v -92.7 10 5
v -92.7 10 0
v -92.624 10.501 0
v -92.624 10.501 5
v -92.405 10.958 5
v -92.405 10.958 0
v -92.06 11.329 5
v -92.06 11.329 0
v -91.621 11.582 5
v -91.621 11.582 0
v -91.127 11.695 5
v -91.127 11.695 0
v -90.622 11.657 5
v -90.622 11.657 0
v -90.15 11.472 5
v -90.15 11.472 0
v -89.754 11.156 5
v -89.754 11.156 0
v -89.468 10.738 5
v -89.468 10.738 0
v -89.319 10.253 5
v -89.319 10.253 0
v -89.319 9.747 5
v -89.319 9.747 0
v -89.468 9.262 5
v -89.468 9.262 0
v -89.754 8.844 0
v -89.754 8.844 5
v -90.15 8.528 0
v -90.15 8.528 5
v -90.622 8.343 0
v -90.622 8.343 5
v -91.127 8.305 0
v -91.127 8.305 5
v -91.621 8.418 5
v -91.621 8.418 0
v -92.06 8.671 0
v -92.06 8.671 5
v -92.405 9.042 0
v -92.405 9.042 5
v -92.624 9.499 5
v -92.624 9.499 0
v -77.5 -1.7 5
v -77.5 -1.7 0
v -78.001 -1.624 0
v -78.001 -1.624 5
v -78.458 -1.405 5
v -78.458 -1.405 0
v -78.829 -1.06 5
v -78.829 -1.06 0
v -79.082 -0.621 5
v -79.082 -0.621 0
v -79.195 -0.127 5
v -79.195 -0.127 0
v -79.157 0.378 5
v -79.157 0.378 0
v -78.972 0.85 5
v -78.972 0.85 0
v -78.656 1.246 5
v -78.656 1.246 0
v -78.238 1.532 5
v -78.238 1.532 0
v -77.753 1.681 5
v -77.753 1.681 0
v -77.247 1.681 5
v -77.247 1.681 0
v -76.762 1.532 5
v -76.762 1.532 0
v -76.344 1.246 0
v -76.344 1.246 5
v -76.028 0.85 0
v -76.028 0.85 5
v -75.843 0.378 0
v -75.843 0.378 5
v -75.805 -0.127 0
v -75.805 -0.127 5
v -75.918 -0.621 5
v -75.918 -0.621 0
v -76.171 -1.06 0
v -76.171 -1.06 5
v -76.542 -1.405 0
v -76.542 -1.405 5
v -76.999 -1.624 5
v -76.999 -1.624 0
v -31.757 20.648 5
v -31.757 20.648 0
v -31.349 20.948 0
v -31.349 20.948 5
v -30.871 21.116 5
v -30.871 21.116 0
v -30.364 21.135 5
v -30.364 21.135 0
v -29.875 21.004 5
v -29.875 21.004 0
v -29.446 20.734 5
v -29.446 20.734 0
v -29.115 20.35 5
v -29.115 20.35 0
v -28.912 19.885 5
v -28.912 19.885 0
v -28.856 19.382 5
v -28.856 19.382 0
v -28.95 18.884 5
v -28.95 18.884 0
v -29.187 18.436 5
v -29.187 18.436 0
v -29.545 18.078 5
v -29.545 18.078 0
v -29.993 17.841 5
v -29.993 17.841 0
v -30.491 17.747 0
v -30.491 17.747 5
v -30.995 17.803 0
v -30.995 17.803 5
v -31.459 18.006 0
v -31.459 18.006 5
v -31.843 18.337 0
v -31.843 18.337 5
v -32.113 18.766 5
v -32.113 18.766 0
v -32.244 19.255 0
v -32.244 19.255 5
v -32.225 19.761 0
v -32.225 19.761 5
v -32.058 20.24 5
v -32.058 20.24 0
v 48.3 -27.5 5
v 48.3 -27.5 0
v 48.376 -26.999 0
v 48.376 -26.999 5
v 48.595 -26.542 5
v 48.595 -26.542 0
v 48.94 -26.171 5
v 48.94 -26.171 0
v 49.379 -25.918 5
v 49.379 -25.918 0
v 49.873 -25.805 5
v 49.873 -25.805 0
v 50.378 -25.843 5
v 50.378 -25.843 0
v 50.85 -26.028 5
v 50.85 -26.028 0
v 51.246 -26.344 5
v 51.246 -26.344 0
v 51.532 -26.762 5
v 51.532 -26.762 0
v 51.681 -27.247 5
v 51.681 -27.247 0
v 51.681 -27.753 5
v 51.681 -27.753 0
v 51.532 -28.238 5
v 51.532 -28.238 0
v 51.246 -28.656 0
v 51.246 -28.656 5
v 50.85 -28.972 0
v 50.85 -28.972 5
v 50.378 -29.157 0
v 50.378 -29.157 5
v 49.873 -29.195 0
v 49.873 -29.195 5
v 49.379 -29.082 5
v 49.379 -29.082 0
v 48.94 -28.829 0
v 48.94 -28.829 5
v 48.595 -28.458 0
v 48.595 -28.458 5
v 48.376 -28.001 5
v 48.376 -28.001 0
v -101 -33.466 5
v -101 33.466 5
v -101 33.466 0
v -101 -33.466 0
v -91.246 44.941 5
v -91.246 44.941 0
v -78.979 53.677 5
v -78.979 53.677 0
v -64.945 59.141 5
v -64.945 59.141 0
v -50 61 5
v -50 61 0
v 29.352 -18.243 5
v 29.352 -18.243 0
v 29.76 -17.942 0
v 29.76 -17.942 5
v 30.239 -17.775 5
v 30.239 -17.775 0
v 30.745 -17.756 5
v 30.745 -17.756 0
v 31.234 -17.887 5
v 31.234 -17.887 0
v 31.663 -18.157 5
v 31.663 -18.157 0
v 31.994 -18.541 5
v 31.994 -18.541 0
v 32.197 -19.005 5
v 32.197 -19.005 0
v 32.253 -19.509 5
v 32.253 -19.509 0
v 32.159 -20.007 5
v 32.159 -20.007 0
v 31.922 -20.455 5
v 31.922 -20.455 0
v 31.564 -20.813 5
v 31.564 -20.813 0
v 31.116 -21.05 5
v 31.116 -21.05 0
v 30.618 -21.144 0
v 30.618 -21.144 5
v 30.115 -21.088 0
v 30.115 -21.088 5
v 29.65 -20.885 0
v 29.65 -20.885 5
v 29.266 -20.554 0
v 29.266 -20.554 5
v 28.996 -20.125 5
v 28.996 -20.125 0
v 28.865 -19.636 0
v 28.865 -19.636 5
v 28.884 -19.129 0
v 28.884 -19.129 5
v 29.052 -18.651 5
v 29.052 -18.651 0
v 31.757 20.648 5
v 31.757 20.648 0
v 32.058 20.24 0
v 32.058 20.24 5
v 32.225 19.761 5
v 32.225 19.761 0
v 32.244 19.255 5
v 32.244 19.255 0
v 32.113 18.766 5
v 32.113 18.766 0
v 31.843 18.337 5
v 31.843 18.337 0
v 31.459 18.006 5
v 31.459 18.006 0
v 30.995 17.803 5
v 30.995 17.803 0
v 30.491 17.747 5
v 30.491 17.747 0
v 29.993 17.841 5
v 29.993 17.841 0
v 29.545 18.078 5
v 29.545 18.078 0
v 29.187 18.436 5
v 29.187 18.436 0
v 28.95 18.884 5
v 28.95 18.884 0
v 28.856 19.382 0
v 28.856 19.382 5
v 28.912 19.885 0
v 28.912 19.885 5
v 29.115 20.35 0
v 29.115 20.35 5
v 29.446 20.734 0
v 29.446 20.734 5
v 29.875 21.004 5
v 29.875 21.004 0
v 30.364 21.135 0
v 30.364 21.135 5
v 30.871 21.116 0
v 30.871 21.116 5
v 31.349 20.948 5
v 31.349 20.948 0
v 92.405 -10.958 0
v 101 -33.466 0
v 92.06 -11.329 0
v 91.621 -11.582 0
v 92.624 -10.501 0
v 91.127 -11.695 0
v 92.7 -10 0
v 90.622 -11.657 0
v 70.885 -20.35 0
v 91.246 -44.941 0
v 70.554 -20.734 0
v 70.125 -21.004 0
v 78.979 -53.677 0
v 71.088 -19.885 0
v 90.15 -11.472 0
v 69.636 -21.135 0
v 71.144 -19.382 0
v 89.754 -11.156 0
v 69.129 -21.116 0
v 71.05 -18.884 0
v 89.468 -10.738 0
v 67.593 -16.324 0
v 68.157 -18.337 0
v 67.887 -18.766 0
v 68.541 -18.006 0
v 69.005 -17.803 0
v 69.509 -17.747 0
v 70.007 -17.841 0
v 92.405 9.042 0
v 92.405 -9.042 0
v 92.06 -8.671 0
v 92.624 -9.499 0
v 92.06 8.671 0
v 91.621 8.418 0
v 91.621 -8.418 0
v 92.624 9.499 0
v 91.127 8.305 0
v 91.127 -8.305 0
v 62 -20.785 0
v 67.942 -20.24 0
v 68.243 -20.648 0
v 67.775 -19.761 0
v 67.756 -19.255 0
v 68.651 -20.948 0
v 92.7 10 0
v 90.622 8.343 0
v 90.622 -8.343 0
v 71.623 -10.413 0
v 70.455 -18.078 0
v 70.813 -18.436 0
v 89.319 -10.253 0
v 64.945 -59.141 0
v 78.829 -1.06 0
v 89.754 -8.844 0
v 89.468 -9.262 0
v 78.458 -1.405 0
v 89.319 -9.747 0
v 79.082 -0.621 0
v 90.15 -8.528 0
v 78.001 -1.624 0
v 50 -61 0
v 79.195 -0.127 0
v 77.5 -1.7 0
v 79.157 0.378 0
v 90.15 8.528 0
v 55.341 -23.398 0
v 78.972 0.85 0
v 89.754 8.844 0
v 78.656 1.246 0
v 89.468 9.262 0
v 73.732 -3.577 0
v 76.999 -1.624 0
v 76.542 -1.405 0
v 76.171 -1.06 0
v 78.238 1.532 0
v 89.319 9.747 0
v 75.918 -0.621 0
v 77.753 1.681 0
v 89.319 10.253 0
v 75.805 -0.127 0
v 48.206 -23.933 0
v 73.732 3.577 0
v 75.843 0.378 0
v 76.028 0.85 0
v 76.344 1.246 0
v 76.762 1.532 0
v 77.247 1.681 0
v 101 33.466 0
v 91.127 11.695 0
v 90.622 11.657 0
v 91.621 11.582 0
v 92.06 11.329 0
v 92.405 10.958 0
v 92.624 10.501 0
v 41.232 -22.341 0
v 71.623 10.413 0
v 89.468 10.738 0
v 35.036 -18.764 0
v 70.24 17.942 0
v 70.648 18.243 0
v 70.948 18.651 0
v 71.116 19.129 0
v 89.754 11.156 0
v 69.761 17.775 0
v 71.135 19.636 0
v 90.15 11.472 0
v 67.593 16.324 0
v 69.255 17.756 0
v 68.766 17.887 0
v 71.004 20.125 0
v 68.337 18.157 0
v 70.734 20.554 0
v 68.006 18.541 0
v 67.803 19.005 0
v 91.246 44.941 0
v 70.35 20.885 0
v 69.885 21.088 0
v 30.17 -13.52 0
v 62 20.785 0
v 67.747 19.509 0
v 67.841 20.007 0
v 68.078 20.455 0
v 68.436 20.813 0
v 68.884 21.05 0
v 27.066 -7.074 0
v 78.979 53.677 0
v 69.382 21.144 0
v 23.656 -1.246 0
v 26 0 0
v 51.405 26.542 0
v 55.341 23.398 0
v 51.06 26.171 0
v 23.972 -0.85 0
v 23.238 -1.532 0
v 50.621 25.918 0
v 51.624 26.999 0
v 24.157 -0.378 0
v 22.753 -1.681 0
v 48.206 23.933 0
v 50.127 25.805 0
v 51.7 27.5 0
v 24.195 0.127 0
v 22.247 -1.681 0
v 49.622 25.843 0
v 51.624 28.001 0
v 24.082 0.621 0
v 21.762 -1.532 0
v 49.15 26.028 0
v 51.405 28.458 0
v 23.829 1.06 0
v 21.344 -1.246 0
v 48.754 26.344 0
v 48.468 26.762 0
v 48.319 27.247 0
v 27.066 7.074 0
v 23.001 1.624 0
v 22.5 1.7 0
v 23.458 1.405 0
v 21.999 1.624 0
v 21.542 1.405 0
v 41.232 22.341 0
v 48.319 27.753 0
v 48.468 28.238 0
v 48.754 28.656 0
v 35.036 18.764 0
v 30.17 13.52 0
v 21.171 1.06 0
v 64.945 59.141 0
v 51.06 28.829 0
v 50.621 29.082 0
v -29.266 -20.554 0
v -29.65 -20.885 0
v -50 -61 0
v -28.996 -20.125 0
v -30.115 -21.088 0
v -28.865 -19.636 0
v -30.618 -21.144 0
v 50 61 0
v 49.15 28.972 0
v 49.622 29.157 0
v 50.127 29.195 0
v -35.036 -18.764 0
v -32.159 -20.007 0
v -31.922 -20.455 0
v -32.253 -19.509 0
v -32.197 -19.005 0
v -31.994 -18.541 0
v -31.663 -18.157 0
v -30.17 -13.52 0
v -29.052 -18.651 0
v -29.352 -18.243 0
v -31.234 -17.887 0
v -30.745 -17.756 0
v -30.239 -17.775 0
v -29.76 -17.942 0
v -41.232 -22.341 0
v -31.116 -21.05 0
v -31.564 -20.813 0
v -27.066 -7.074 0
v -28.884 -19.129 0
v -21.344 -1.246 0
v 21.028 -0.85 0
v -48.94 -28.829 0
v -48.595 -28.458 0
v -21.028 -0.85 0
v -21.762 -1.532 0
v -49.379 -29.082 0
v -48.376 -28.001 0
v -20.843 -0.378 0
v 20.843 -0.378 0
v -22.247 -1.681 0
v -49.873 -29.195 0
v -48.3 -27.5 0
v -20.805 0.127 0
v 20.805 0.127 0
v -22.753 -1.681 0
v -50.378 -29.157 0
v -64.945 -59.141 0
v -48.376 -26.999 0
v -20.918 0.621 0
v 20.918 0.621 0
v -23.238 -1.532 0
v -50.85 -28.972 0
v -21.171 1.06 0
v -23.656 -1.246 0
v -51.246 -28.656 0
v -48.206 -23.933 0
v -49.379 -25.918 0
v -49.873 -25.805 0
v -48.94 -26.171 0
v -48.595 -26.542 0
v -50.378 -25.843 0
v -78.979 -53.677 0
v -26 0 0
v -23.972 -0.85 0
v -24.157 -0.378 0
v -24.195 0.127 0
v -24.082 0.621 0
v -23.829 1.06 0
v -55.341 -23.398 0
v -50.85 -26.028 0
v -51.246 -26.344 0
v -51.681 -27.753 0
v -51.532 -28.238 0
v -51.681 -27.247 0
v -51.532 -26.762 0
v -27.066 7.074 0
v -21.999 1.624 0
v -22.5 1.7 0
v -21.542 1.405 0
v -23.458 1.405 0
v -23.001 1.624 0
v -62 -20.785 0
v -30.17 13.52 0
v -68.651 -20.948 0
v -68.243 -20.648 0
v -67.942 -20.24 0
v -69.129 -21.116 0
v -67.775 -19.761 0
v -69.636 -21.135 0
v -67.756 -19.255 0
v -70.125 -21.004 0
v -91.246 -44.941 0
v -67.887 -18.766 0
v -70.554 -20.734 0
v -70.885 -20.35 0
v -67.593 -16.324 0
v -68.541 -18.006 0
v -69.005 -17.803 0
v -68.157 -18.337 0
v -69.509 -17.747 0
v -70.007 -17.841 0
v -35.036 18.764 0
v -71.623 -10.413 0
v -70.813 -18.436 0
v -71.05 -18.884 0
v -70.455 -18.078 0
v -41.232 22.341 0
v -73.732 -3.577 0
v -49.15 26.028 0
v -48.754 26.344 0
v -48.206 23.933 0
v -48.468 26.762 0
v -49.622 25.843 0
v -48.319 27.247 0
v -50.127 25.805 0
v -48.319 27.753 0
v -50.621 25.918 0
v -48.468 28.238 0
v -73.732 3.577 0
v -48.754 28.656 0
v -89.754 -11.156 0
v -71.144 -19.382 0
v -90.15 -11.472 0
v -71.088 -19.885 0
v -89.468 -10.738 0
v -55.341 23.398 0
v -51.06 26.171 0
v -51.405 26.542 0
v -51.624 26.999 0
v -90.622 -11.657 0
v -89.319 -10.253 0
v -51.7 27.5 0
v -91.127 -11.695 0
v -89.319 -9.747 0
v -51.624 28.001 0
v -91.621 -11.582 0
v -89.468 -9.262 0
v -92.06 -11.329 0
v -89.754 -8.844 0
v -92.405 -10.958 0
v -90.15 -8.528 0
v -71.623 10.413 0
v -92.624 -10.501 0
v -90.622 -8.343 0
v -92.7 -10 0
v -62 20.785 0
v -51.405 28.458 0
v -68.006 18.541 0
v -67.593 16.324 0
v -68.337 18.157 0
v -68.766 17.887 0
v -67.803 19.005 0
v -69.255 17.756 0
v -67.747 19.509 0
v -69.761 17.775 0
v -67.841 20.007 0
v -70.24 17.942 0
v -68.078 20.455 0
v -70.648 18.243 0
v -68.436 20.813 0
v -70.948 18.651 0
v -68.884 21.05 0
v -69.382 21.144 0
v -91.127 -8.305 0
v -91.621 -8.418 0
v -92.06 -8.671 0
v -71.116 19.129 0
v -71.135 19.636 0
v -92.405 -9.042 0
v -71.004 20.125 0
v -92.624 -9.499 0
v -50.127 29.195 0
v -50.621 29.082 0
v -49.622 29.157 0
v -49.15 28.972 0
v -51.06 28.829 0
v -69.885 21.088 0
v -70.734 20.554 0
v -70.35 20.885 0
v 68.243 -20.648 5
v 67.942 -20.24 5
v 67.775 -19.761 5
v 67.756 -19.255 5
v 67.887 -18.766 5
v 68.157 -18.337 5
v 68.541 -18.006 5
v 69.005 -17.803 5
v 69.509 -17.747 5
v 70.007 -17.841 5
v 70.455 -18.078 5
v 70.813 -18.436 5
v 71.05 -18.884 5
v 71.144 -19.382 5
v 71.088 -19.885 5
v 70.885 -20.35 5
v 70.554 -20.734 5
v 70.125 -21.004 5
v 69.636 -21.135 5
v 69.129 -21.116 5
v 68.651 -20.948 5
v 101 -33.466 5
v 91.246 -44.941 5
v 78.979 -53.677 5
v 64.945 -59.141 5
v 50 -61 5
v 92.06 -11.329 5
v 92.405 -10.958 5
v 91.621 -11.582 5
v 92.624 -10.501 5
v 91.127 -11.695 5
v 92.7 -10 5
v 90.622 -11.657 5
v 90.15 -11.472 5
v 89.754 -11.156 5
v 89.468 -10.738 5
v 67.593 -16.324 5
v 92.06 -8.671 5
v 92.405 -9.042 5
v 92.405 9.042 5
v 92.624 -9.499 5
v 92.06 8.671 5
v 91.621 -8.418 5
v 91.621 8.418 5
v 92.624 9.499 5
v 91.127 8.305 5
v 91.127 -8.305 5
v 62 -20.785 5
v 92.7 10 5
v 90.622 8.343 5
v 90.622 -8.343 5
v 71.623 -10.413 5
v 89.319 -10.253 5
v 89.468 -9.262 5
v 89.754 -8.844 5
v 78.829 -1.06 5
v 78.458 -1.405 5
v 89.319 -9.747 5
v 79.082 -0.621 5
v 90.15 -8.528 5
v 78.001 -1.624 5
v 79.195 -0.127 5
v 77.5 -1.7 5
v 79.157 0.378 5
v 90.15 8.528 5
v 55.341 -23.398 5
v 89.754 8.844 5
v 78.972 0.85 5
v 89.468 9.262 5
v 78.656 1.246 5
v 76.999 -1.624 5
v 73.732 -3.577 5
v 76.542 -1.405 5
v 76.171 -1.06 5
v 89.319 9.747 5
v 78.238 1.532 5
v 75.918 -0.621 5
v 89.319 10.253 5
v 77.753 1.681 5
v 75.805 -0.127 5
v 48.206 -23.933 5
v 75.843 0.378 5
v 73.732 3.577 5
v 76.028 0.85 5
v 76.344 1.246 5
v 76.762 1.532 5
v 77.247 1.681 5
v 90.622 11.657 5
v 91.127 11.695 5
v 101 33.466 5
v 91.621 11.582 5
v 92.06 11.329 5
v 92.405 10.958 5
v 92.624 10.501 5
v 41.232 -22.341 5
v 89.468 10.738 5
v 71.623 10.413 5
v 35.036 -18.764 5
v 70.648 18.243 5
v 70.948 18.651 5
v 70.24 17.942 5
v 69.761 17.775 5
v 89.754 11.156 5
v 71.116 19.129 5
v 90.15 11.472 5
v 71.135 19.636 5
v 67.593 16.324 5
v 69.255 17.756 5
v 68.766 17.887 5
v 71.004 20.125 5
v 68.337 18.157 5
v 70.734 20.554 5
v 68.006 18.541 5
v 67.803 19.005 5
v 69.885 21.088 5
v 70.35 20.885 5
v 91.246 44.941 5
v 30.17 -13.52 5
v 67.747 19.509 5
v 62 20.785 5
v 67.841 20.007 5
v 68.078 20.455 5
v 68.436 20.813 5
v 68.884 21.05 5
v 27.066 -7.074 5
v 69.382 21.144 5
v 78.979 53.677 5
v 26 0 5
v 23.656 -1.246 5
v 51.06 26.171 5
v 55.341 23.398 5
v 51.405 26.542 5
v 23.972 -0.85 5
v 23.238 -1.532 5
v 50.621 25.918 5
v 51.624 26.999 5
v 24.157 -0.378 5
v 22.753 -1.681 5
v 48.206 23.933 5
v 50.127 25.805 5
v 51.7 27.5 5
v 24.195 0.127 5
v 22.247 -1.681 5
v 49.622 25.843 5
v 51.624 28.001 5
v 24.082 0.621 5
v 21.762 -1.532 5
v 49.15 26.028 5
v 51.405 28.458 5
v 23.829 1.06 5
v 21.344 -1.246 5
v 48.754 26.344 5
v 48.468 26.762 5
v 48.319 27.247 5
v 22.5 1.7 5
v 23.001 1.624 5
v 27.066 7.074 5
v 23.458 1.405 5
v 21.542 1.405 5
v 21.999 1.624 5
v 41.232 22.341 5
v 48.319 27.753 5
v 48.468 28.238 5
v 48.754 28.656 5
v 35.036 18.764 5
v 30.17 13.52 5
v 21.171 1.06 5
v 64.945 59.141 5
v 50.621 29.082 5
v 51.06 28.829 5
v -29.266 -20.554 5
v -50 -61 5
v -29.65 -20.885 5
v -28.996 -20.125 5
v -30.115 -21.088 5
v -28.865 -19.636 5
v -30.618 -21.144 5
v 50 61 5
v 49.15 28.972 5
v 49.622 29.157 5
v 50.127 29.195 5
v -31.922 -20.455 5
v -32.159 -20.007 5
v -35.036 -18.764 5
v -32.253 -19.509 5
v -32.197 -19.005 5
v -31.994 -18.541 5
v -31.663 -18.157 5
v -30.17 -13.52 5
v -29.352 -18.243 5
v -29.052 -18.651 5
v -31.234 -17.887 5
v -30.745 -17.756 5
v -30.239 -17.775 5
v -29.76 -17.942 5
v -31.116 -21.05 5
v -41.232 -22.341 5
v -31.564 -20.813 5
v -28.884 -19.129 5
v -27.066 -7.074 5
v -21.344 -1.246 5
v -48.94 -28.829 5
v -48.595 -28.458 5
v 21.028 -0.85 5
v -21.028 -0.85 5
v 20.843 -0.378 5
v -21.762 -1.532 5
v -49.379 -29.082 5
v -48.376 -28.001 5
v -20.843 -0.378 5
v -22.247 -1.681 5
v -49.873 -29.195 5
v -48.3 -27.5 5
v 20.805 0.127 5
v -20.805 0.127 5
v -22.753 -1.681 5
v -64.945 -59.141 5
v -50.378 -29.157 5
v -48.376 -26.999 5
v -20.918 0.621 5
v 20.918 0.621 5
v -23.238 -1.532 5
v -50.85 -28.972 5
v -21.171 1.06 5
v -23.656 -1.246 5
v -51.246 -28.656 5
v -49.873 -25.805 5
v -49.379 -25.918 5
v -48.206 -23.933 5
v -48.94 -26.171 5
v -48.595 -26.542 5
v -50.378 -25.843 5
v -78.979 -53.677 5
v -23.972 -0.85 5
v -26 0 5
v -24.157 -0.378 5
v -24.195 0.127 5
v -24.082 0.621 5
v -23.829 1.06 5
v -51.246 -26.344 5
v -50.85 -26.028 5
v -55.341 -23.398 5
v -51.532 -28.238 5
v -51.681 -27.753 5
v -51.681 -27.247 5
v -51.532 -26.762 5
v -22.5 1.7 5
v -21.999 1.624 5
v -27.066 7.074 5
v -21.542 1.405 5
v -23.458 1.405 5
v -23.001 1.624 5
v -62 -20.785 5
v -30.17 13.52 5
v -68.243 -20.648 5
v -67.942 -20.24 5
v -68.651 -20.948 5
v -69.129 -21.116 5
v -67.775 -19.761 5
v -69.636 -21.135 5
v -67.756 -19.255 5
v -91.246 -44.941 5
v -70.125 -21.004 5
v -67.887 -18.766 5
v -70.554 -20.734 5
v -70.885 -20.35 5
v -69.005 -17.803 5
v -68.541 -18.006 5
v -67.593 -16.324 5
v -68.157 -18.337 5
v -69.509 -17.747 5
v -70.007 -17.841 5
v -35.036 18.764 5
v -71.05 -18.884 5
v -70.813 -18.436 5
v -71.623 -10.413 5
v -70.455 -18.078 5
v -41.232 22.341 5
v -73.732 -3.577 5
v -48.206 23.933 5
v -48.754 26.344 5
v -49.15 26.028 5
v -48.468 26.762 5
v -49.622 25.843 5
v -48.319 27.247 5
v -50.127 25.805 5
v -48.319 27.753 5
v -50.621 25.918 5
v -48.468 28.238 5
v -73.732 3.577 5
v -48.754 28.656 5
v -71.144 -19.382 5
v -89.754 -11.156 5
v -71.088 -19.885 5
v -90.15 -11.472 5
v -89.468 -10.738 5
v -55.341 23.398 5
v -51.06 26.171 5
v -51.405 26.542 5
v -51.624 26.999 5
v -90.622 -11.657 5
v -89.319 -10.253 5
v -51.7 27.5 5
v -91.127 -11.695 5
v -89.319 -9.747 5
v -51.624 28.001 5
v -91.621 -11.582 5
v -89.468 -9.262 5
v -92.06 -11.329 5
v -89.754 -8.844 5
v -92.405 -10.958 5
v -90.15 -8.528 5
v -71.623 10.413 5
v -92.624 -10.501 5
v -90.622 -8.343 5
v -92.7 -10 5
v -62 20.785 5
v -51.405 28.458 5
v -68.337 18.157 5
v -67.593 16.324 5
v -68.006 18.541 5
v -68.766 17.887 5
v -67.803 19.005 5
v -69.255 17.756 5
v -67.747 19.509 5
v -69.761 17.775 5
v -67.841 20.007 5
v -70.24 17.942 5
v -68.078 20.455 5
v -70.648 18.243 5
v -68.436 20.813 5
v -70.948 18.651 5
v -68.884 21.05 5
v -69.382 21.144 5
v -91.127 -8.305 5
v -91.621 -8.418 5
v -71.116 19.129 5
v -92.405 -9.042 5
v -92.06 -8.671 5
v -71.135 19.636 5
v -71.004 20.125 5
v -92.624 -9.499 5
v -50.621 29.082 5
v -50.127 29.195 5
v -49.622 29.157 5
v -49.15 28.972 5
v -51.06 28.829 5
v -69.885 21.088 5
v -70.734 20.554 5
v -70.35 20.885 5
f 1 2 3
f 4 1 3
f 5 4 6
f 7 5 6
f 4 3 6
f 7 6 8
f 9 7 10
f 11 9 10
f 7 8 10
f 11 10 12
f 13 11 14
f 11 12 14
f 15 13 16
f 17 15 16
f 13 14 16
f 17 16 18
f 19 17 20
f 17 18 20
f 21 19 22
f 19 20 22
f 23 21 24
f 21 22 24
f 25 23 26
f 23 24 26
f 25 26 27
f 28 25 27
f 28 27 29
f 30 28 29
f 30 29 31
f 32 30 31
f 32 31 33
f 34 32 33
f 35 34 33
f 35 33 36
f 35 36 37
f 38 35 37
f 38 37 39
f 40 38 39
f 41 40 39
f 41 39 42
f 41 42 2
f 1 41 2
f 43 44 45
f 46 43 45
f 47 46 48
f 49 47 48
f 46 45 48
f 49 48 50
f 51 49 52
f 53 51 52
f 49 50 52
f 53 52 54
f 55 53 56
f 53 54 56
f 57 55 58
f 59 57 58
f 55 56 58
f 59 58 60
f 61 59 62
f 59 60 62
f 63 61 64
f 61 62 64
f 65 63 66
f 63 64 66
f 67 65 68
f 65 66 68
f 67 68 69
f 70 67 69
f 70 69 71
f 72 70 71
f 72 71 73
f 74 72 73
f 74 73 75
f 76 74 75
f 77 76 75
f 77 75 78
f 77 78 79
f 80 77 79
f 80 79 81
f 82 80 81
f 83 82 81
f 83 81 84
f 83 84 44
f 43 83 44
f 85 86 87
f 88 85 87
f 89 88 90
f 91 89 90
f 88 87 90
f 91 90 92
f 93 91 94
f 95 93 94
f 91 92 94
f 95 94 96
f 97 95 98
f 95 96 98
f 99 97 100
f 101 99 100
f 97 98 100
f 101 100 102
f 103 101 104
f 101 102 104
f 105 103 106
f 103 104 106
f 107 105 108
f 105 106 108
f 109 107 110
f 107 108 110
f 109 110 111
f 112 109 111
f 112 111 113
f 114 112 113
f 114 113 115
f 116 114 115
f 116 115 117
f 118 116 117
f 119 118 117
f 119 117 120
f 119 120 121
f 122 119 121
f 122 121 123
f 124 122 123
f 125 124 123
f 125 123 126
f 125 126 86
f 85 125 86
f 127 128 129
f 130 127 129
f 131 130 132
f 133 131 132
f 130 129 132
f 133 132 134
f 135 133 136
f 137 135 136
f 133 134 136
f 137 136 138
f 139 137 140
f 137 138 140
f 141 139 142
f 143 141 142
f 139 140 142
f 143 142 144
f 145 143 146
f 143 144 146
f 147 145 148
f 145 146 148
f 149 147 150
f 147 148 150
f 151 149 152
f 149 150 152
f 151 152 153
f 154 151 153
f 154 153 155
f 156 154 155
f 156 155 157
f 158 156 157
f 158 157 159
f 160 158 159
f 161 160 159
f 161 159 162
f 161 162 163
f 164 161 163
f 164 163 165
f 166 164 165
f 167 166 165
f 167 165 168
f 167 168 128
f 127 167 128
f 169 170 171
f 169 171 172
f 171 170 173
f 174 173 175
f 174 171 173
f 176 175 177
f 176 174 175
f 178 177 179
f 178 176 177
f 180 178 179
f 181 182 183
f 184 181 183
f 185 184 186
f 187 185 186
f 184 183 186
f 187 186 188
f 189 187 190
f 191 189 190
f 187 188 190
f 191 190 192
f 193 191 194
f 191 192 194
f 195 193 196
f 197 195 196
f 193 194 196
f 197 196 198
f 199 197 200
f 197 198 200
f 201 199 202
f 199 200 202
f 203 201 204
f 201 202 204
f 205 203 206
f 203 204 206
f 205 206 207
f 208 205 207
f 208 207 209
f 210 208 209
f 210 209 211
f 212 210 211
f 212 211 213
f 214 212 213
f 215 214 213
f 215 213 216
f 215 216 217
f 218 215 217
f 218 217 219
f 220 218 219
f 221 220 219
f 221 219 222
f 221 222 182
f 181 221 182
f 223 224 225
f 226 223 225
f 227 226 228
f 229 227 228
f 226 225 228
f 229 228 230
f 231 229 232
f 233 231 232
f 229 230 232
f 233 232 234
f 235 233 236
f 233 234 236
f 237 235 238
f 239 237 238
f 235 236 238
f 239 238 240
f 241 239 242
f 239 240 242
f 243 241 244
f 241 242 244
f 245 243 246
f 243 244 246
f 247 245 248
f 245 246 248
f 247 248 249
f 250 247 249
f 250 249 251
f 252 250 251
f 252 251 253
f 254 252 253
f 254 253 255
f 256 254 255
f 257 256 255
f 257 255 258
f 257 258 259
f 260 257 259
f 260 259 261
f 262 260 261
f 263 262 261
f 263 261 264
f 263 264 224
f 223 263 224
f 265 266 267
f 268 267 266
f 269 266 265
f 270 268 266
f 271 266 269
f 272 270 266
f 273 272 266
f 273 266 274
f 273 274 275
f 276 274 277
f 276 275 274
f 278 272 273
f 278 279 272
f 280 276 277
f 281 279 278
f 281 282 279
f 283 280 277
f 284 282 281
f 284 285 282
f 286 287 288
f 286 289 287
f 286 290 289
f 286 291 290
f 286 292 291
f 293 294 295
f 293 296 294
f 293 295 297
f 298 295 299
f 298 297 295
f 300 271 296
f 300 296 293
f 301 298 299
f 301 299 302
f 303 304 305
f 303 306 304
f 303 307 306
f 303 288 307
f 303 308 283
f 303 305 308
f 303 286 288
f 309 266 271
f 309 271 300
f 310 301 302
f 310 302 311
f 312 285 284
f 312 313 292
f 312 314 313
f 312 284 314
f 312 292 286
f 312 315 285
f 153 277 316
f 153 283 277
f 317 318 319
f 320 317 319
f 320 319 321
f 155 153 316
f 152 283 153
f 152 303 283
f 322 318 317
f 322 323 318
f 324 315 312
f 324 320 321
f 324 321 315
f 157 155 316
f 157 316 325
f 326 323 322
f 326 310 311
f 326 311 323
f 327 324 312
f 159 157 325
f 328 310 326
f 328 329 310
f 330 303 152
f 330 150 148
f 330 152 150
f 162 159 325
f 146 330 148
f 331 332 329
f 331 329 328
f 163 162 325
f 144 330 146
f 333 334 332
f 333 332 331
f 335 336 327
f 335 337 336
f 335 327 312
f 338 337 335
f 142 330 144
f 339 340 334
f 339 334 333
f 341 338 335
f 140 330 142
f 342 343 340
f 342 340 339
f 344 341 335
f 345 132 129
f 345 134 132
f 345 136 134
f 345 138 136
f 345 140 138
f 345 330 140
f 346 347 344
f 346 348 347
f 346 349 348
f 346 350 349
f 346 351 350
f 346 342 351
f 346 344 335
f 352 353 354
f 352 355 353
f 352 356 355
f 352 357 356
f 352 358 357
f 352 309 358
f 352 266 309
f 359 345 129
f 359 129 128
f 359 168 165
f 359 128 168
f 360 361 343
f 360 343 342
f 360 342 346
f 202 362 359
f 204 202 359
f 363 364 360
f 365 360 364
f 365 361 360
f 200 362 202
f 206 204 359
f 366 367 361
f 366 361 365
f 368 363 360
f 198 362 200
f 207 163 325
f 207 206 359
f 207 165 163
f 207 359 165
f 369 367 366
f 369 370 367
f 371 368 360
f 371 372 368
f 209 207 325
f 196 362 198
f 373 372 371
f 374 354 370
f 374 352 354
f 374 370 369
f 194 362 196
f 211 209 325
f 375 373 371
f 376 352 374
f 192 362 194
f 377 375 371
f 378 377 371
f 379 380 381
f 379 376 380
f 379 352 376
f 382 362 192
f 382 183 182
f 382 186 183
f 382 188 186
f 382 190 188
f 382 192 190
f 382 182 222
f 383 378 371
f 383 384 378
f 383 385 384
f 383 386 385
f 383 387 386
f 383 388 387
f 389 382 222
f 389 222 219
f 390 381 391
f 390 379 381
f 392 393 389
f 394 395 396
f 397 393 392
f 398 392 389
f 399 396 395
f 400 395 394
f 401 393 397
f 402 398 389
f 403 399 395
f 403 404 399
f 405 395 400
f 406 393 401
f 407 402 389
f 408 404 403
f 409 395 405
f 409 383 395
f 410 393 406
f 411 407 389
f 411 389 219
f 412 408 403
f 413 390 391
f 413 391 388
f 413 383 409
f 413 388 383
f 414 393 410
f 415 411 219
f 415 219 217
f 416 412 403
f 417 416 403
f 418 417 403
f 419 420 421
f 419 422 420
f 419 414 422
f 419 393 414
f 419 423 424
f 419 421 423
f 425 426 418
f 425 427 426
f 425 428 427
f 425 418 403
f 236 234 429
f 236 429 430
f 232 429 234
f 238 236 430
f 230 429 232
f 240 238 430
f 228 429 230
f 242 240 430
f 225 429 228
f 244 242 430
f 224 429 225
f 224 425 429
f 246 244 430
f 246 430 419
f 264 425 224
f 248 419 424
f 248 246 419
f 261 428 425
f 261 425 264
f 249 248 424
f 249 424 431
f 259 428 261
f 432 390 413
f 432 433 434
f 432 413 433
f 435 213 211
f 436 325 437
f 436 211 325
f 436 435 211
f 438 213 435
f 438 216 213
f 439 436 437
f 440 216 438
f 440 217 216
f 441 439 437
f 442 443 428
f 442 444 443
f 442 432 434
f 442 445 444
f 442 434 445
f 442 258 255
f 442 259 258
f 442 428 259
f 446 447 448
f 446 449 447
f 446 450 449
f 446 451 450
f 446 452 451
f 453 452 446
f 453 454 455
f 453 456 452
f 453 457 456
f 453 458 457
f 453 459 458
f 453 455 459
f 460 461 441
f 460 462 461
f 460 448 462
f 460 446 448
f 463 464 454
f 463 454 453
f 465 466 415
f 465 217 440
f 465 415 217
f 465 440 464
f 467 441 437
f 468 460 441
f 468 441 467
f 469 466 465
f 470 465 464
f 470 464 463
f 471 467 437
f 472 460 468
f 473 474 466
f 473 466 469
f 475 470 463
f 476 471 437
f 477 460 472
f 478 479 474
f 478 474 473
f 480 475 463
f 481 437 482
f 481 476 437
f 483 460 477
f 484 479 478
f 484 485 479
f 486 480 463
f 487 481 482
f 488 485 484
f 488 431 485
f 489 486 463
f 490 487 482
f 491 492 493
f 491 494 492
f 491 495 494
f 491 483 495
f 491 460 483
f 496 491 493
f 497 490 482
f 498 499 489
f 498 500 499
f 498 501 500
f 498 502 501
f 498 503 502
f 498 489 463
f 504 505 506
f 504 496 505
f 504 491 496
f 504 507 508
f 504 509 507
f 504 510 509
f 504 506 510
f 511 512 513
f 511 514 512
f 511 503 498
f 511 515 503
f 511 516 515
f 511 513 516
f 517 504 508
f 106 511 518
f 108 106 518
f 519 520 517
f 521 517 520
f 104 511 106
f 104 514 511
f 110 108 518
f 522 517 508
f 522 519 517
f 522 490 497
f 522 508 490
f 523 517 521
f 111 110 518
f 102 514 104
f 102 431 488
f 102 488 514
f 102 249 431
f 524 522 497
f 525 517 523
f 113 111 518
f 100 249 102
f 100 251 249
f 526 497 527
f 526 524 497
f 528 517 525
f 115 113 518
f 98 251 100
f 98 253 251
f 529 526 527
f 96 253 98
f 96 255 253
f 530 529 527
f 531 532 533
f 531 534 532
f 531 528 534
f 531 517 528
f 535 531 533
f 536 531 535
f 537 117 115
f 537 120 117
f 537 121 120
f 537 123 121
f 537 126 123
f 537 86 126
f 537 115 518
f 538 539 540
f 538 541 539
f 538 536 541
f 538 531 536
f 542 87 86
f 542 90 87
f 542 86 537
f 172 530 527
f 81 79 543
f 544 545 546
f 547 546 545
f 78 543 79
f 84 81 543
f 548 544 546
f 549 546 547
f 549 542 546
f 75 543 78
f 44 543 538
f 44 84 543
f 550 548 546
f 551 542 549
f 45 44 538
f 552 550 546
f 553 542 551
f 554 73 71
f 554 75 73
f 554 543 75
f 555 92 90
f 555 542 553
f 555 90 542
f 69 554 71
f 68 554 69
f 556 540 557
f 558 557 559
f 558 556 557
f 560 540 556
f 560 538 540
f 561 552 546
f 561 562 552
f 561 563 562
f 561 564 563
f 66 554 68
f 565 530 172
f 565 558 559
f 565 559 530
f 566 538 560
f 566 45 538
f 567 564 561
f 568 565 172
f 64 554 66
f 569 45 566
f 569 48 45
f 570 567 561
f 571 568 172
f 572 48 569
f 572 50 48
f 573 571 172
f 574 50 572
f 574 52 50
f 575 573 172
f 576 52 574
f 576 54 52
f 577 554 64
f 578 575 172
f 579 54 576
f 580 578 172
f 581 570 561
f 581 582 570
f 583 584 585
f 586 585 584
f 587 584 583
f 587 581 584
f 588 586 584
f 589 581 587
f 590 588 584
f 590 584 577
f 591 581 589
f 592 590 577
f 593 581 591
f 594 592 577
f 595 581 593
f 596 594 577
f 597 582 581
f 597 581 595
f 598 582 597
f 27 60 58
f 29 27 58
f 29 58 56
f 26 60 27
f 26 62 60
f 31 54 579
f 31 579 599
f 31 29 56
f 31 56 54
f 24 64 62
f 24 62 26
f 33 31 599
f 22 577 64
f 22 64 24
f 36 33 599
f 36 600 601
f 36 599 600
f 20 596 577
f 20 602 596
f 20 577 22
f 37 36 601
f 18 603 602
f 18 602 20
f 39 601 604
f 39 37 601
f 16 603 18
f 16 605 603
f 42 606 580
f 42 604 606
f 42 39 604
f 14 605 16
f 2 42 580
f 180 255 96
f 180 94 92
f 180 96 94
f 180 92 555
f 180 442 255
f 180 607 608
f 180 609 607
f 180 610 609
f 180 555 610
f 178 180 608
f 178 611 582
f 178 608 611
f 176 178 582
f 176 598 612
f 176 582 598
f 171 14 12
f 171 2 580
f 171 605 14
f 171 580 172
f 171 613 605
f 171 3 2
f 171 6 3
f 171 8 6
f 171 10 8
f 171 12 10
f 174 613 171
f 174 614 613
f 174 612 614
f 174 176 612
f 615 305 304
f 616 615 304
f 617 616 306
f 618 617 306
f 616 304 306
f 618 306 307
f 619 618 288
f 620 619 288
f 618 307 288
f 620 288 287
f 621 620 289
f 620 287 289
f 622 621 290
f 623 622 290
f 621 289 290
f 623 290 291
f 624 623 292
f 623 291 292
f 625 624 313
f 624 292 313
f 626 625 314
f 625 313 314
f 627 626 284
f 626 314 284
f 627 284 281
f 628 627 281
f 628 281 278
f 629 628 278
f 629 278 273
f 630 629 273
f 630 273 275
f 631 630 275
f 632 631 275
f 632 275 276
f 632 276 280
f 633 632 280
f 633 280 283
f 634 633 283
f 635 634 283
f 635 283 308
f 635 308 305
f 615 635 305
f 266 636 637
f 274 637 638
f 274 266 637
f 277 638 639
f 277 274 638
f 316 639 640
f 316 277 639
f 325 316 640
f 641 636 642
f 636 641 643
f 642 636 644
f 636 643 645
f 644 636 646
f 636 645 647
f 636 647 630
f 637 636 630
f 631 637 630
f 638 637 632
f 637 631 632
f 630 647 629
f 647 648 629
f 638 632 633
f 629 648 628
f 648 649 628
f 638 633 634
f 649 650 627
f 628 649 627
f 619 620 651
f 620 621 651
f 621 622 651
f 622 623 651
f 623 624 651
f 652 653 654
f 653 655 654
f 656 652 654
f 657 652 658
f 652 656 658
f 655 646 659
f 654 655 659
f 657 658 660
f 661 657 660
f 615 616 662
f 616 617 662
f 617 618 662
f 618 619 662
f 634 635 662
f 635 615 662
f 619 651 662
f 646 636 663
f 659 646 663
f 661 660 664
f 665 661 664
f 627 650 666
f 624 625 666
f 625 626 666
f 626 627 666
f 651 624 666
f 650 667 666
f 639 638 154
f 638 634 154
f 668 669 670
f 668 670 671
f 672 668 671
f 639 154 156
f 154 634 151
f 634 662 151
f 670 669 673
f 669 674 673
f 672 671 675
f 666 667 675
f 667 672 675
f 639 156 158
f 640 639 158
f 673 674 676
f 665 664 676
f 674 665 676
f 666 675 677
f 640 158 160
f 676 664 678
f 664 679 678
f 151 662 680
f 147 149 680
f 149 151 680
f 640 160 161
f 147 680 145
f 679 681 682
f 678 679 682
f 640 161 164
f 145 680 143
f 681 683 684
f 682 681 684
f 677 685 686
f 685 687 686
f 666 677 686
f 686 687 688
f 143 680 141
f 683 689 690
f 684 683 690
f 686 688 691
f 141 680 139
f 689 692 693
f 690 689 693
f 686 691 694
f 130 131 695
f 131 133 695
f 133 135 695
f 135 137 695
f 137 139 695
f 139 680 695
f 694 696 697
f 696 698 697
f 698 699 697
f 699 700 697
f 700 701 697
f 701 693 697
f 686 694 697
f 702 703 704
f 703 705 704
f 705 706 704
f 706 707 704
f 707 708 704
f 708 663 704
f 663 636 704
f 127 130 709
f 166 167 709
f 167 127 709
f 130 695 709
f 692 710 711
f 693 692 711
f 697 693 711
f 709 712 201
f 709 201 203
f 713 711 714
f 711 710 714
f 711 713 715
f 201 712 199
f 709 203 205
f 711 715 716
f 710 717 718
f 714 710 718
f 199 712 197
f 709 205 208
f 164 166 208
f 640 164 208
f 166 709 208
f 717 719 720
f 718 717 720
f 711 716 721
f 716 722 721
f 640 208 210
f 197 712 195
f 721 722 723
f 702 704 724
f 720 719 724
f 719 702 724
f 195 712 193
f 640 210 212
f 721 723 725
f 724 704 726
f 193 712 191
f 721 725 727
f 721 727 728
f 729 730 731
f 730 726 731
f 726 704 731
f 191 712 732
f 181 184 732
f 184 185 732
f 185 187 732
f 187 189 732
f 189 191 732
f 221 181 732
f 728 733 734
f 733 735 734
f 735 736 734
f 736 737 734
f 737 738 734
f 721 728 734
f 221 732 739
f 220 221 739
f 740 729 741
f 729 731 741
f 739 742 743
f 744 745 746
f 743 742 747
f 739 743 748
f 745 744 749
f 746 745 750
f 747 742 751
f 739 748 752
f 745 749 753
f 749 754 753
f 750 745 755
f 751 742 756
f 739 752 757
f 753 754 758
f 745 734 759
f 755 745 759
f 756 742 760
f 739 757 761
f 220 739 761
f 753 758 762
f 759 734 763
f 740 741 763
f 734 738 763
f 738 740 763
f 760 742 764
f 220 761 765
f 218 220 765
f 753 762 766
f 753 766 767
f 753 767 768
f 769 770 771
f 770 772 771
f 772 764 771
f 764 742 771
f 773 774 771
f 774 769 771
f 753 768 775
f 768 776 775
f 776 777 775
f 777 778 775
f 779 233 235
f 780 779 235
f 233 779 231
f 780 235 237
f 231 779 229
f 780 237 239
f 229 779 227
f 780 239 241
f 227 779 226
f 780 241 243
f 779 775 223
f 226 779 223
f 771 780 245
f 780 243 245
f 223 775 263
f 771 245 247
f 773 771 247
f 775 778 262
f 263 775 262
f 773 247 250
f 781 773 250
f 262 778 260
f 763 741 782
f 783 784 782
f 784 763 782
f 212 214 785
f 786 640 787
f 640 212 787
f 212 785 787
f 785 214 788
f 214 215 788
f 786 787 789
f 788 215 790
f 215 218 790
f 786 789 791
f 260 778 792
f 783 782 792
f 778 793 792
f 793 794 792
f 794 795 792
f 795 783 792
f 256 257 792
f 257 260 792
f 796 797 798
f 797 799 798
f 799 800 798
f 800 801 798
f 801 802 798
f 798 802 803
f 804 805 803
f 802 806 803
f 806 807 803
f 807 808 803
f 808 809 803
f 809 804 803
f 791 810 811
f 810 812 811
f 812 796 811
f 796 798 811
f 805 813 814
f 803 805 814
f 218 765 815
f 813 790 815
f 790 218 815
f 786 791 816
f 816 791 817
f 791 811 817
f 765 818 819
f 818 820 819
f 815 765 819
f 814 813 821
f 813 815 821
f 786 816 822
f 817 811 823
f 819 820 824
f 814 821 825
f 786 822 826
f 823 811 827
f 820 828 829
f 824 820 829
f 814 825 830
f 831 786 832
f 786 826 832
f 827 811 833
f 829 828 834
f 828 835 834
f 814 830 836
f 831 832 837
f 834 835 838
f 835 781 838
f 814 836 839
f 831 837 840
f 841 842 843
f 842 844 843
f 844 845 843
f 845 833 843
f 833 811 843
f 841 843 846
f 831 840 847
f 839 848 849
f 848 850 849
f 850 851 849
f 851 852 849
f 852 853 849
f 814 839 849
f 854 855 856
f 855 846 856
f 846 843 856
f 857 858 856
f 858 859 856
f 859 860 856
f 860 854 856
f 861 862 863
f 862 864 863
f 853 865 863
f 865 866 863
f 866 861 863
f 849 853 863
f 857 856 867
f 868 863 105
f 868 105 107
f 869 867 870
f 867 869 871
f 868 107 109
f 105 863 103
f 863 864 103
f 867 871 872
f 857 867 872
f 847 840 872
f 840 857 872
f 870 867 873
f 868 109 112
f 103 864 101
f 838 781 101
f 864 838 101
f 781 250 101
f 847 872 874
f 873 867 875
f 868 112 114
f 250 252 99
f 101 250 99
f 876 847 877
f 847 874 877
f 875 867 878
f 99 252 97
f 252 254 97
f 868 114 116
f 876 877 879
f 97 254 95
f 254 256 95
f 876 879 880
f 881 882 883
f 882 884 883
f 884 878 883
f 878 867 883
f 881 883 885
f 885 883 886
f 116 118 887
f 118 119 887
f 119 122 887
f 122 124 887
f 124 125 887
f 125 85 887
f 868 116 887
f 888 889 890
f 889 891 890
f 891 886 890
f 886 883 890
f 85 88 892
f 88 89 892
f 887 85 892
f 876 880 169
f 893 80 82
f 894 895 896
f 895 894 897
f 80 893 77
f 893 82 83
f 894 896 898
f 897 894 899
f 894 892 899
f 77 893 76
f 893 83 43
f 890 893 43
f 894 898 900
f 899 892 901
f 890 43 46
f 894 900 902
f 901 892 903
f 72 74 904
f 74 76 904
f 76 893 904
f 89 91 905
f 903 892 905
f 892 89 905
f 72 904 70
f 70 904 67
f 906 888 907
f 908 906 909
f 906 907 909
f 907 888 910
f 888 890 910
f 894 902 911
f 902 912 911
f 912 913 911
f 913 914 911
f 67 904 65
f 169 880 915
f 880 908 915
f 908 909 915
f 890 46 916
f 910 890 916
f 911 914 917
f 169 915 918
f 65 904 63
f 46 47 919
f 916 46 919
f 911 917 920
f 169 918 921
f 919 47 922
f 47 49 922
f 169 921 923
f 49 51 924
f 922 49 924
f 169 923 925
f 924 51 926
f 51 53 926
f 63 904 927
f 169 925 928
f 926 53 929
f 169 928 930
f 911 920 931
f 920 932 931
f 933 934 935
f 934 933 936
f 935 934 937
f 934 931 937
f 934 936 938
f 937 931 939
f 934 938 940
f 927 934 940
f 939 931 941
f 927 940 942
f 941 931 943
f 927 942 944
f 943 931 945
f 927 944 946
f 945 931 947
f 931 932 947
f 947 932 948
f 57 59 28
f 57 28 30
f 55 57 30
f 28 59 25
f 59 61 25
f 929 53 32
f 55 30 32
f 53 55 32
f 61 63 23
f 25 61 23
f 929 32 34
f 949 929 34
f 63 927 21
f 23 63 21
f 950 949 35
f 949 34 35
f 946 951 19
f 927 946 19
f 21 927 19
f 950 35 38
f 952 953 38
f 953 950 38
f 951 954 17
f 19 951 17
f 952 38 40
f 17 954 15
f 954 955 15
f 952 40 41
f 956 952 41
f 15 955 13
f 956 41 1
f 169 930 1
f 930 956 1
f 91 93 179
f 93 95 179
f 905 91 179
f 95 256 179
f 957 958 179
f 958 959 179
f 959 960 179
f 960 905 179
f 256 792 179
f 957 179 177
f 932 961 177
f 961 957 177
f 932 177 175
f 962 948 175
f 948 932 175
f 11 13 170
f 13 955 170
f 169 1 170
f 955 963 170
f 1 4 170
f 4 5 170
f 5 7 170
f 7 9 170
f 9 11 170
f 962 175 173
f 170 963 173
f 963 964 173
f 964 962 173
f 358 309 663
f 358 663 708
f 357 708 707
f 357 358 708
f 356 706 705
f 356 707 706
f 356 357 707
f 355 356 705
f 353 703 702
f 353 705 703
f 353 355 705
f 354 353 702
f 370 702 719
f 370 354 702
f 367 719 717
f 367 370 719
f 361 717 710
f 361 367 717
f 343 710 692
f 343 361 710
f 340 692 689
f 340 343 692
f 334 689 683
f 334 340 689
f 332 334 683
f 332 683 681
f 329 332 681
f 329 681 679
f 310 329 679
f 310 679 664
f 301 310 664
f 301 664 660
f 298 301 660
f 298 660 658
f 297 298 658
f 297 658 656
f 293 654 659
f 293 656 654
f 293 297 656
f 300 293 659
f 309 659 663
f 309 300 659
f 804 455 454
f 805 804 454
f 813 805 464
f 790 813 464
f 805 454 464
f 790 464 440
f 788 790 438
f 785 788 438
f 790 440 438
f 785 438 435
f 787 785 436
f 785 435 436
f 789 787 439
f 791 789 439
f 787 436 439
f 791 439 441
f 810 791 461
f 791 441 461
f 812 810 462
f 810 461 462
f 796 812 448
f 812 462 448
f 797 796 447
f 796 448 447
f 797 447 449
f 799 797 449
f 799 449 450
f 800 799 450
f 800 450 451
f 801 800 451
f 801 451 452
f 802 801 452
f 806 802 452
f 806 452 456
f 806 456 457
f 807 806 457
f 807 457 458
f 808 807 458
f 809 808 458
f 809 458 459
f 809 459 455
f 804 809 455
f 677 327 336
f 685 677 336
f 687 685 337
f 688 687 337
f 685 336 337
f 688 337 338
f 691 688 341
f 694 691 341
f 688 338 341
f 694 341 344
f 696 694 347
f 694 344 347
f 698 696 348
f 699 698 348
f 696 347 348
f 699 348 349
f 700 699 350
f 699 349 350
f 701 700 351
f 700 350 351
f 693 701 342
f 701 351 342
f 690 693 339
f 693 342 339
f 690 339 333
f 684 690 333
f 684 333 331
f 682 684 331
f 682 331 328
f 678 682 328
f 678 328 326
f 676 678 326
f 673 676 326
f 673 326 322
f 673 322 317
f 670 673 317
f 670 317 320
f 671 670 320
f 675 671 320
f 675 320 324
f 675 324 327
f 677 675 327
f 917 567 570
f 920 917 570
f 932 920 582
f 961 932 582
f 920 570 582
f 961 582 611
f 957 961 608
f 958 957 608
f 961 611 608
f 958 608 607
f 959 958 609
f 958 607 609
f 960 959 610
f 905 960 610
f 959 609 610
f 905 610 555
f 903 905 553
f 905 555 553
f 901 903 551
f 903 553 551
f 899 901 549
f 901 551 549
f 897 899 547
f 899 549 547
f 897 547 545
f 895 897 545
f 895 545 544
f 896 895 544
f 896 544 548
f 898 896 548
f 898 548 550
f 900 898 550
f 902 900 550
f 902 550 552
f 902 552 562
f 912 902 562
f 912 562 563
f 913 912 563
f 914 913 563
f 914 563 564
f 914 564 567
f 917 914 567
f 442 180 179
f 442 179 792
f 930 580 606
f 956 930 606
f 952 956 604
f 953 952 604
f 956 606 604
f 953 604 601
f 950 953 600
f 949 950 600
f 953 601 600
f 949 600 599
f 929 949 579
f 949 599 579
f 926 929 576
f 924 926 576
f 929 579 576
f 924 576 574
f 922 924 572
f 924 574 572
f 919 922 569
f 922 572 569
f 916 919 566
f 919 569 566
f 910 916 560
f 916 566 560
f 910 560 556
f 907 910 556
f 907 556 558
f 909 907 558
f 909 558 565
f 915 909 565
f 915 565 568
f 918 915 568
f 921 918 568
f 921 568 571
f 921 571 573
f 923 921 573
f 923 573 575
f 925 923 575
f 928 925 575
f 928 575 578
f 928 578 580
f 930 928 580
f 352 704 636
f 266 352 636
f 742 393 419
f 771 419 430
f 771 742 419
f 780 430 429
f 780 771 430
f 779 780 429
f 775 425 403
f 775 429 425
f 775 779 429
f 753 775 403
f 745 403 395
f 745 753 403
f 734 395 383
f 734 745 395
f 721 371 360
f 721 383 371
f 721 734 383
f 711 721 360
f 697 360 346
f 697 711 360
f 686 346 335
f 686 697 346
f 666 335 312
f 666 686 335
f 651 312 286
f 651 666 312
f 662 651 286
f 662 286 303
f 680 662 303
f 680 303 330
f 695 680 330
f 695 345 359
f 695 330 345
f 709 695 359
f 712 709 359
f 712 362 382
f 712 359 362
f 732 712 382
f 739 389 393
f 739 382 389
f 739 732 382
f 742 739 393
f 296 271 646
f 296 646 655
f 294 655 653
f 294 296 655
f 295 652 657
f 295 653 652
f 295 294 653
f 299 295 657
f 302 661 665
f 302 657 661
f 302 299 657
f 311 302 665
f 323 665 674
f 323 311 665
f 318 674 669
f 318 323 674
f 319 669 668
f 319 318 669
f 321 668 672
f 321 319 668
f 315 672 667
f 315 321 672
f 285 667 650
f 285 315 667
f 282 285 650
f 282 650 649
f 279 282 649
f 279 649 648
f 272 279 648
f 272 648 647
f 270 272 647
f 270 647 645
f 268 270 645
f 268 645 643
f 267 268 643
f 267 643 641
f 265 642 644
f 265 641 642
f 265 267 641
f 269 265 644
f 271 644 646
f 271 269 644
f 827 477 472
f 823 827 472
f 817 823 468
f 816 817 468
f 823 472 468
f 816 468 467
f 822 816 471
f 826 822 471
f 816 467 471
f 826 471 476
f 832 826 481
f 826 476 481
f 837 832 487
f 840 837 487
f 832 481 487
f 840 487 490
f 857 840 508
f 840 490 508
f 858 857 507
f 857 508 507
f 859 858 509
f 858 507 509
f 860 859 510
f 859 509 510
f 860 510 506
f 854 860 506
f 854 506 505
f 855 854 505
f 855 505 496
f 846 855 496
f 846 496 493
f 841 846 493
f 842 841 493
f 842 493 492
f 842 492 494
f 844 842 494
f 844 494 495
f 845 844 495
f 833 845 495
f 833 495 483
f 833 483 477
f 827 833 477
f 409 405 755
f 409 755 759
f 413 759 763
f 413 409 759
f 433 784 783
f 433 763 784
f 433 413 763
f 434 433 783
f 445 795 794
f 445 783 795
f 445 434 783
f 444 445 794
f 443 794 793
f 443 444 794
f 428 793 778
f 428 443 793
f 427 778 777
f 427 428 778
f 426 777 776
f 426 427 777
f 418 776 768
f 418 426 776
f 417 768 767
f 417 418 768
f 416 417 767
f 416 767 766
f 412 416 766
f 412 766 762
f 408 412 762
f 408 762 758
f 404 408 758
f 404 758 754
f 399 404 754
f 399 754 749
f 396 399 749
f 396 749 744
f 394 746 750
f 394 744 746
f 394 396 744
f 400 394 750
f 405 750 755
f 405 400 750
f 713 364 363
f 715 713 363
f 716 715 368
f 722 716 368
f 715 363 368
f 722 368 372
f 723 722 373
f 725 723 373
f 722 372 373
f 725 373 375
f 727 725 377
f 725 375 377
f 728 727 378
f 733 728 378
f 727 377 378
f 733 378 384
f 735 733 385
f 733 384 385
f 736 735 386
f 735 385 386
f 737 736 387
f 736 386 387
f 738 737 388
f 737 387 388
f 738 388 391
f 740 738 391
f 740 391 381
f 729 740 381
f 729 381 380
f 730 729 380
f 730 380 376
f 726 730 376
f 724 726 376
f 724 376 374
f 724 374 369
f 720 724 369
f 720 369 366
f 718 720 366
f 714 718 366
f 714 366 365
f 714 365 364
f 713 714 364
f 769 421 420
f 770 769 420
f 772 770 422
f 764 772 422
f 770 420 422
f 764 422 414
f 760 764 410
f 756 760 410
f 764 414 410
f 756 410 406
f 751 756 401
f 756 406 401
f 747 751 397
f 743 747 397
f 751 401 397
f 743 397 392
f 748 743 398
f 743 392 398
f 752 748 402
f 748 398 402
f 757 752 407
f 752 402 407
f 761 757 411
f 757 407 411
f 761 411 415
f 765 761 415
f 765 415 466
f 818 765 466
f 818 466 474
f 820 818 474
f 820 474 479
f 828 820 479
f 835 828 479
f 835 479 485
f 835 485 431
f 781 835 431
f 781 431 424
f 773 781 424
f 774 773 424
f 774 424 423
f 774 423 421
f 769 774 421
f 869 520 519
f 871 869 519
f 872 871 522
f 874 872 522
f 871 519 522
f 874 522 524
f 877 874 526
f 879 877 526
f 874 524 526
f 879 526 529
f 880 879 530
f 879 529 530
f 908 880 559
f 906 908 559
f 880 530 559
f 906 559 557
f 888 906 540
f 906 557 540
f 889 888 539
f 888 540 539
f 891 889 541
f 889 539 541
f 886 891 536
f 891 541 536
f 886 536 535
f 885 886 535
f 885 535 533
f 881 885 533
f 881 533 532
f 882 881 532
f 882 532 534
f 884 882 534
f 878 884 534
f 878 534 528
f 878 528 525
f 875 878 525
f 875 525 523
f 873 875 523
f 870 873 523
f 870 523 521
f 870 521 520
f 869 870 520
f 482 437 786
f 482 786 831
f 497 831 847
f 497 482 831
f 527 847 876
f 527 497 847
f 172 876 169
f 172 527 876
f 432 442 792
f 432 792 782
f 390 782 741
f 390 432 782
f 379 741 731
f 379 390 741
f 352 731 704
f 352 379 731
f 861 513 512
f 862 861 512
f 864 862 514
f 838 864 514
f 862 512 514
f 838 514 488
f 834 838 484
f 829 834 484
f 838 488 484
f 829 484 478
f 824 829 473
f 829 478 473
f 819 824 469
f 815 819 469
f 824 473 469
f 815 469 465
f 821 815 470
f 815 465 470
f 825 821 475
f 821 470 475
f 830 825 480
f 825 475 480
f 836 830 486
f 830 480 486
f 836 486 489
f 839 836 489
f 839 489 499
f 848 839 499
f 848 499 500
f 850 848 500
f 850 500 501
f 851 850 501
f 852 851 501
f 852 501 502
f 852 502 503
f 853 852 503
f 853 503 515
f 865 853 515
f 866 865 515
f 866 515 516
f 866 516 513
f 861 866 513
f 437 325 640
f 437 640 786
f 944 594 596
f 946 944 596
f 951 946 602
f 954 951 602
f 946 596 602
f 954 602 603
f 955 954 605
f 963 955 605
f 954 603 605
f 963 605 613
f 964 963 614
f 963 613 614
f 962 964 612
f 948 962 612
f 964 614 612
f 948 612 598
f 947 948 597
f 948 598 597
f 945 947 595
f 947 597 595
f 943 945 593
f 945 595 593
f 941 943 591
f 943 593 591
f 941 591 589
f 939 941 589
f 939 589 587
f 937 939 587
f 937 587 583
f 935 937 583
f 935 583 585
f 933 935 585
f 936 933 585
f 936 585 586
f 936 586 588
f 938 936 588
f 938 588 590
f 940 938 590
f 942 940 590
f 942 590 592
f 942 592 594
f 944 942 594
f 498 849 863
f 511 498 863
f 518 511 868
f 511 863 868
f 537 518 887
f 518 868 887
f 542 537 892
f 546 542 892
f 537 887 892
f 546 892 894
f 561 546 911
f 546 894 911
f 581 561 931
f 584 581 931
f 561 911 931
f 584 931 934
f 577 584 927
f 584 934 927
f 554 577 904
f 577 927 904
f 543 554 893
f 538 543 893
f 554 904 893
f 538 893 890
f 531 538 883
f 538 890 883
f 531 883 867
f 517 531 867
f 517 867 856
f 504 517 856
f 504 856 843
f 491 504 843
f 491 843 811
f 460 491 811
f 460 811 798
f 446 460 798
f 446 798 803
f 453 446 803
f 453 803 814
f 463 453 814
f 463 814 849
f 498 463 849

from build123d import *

# Parameters (mm, degrees)
EXTRUDE_1_DEPTH          = 5
SKETCH_2_R               = 24
CUT_EXTRUDE_1_DEPTH      = 6
HOLE_WIZARD_M3_1_D       = 3.4
PATTERN_CIRCULAR_1_COUNT = 8
MIRROR_1_COPY_1_D        = 3.4
MIRROR_1_COPY_2_D        = 3.4
MIRROR_1_COPY_3_D        = 3.4
MIRROR_1_COPY_4_D        = 3.4
MIRROR_1_COPY_5_D        = 3.4
MIRROR_1_COPY_6_D        = 3.4
MIRROR_1_COPY_7_D        = 3.4
CUT_EXTRUDE_2_DEPTH      = 6
HOLE_WIZARD_M3_2_D       = 3.4


with BuildPart() as part:
    # ｽｹｯﾁ1 → ﾎﾞｽ - 押し出し1 (new body)
    with BuildSketch(Plane.XY):
        with BuildLine():
            Line((-50, 61), (50, 61))
            ThreePointArc((50, 61), (111, 0), (50, -61))
            Line((50, -61), (-50, -61))
            ThreePointArc((-50, -61), (-111, 0), (-50, 61))
        make_face()
    extrude(amount=EXTRUDE_1_DEPTH)

    # ｽｹｯﾁ2 → ｶｯﾄ - 押し出し1 (cut, through all)
    with BuildSketch(Plane.XY.offset(5)):
        with Locations((-50, 0)):
            Circle(SKETCH_2_R)
    cut_extrude_1 = extrude(amount=-CUT_EXTRUDE_1_DEPTH, mode=Mode.SUBTRACT)

    # M3 すきま穴1 (through all)
    with Locations(Plane.XY.offset(5)):
        with Locations((-50, 27.5)):
            hole_wizard_m3_1 = Hole(HOLE_WIZARD_M3_1_D / 2)

    # 円形ﾊﾟﾀｰﾝ1: M3 すきま穴1 ×8 about axis
    pattern_circular_1_axis = Axis((-50, 0, 0), (0, 0, 1))
    for i in range(1, PATTERN_CIRCULAR_1_COUNT):
        add(hole_wizard_m3_1.rotate(pattern_circular_1_axis, i * 360 / PATTERN_CIRCULAR_1_COUNT), mode=Mode.SUBTRACT)

    # ﾐﾗｰ1: ｶｯﾄ - 押し出し1, M3 すきま穴1 across plane
    add(cut_extrude_1.mirror(Plane(origin=(0, 0, 0), x_dir=(0, 0, 1), z_dir=(1, 0, 0))), mode=Mode.SUBTRACT)
    add(hole_wizard_m3_1.mirror(Plane(origin=(0, 0, 0), x_dir=(0, 0, 1), z_dir=(1, 0, 0))), mode=Mode.SUBTRACT)

    # ﾐﾗｰ1 copy 1 (through all)
    with Locations(Plane(origin=(14.644660941, 35.355339059, 5), x_dir=(-0.707106781, 0.707106781, 0), z_dir=(0, 0, 1))):
        with Locations((-50, -27.5)):
            Hole(MIRROR_1_COPY_1_D / 2)

    # ﾐﾗｰ1 copy 2 (through all)
    with Locations(Plane(origin=(50, 50, 5), x_dir=(0, 1, 0), z_dir=(0, 0, 1))):
        with Locations((-50, -27.5)):
            Hole(MIRROR_1_COPY_2_D / 2)

    # ﾐﾗｰ1 copy 3 (through all)
    with Locations(Plane(origin=(85.355339059, 35.355339059, 5), x_dir=(0.707106781, 0.707106781, 0), z_dir=(0, 0, 1))):
        with Locations((-50, -27.5)):
            Hole(MIRROR_1_COPY_3_D / 2)

    # ﾐﾗｰ1 copy 4 (through all)
    with Locations(Plane(origin=(100, 0, 5), x_dir=(1, 0, 0), z_dir=(0, 0, 1))):
        with Locations((-50, -27.5)):
            Hole(MIRROR_1_COPY_4_D / 2)

    # ﾐﾗｰ1 copy 5 (through all)
    with Locations(Plane(origin=(85.355339059, -35.355339059, 5), x_dir=(0.707106781, -0.707106781, 0), z_dir=(0, 0, 1))):
        with Locations((-50, -27.5)):
            Hole(MIRROR_1_COPY_5_D / 2)

    # ﾐﾗｰ1 copy 6 (through all)
    with Locations(Plane(origin=(50, -50, 5), x_dir=(0, -1, 0), z_dir=(0, 0, 1))):
        with Locations((-50, -27.5)):
            Hole(MIRROR_1_COPY_6_D / 2)

    # ﾐﾗｰ1 copy 7 (through all)
    with Locations(Plane(origin=(14.644660941, -35.355339059, 5), x_dir=(-0.707106781, -0.707106781, 0), z_dir=(0, 0, 1))):
        with Locations((-50, -27.5)):
            Hole(MIRROR_1_COPY_7_D / 2)

    # ｽｹｯﾁ5 → ｶｯﾄ - 押し出し2 (cut, through all)
    with BuildSketch(Plane.XY.offset(5)):
        with BuildLine():
            Line((-101, 33.466401061), (-101, -33.466401061))
            ThreePointArc((-101, -33.466401061), (-111, 0), (-101, 33.466401061))
        make_face()
    cut_extrude_2 = extrude(amount=-CUT_EXTRUDE_2_DEPTH, mode=Mode.SUBTRACT)

    # M3 すきま穴2 (through all)
    with Locations(Plane.XY.offset(5)):
        with Locations((-91, 10), (-91, -10)):
            hole_wizard_m3_2 = Hole(HOLE_WIZARD_M3_2_D / 2)

    # ﾐﾗｰ2: ｶｯﾄ - 押し出し2, M3 すきま穴2 across plane
    add(cut_extrude_2.mirror(Plane(origin=(0, 0, 0), x_dir=(0, 0, 1), z_dir=(1, 0, 0))), mode=Mode.SUBTRACT)
    add(hole_wizard_m3_2.mirror(Plane(origin=(0, 0, 0), x_dir=(0, 0, 1), z_dir=(1, 0, 0))), mode=Mode.SUBTRACT)


solid = part.part
